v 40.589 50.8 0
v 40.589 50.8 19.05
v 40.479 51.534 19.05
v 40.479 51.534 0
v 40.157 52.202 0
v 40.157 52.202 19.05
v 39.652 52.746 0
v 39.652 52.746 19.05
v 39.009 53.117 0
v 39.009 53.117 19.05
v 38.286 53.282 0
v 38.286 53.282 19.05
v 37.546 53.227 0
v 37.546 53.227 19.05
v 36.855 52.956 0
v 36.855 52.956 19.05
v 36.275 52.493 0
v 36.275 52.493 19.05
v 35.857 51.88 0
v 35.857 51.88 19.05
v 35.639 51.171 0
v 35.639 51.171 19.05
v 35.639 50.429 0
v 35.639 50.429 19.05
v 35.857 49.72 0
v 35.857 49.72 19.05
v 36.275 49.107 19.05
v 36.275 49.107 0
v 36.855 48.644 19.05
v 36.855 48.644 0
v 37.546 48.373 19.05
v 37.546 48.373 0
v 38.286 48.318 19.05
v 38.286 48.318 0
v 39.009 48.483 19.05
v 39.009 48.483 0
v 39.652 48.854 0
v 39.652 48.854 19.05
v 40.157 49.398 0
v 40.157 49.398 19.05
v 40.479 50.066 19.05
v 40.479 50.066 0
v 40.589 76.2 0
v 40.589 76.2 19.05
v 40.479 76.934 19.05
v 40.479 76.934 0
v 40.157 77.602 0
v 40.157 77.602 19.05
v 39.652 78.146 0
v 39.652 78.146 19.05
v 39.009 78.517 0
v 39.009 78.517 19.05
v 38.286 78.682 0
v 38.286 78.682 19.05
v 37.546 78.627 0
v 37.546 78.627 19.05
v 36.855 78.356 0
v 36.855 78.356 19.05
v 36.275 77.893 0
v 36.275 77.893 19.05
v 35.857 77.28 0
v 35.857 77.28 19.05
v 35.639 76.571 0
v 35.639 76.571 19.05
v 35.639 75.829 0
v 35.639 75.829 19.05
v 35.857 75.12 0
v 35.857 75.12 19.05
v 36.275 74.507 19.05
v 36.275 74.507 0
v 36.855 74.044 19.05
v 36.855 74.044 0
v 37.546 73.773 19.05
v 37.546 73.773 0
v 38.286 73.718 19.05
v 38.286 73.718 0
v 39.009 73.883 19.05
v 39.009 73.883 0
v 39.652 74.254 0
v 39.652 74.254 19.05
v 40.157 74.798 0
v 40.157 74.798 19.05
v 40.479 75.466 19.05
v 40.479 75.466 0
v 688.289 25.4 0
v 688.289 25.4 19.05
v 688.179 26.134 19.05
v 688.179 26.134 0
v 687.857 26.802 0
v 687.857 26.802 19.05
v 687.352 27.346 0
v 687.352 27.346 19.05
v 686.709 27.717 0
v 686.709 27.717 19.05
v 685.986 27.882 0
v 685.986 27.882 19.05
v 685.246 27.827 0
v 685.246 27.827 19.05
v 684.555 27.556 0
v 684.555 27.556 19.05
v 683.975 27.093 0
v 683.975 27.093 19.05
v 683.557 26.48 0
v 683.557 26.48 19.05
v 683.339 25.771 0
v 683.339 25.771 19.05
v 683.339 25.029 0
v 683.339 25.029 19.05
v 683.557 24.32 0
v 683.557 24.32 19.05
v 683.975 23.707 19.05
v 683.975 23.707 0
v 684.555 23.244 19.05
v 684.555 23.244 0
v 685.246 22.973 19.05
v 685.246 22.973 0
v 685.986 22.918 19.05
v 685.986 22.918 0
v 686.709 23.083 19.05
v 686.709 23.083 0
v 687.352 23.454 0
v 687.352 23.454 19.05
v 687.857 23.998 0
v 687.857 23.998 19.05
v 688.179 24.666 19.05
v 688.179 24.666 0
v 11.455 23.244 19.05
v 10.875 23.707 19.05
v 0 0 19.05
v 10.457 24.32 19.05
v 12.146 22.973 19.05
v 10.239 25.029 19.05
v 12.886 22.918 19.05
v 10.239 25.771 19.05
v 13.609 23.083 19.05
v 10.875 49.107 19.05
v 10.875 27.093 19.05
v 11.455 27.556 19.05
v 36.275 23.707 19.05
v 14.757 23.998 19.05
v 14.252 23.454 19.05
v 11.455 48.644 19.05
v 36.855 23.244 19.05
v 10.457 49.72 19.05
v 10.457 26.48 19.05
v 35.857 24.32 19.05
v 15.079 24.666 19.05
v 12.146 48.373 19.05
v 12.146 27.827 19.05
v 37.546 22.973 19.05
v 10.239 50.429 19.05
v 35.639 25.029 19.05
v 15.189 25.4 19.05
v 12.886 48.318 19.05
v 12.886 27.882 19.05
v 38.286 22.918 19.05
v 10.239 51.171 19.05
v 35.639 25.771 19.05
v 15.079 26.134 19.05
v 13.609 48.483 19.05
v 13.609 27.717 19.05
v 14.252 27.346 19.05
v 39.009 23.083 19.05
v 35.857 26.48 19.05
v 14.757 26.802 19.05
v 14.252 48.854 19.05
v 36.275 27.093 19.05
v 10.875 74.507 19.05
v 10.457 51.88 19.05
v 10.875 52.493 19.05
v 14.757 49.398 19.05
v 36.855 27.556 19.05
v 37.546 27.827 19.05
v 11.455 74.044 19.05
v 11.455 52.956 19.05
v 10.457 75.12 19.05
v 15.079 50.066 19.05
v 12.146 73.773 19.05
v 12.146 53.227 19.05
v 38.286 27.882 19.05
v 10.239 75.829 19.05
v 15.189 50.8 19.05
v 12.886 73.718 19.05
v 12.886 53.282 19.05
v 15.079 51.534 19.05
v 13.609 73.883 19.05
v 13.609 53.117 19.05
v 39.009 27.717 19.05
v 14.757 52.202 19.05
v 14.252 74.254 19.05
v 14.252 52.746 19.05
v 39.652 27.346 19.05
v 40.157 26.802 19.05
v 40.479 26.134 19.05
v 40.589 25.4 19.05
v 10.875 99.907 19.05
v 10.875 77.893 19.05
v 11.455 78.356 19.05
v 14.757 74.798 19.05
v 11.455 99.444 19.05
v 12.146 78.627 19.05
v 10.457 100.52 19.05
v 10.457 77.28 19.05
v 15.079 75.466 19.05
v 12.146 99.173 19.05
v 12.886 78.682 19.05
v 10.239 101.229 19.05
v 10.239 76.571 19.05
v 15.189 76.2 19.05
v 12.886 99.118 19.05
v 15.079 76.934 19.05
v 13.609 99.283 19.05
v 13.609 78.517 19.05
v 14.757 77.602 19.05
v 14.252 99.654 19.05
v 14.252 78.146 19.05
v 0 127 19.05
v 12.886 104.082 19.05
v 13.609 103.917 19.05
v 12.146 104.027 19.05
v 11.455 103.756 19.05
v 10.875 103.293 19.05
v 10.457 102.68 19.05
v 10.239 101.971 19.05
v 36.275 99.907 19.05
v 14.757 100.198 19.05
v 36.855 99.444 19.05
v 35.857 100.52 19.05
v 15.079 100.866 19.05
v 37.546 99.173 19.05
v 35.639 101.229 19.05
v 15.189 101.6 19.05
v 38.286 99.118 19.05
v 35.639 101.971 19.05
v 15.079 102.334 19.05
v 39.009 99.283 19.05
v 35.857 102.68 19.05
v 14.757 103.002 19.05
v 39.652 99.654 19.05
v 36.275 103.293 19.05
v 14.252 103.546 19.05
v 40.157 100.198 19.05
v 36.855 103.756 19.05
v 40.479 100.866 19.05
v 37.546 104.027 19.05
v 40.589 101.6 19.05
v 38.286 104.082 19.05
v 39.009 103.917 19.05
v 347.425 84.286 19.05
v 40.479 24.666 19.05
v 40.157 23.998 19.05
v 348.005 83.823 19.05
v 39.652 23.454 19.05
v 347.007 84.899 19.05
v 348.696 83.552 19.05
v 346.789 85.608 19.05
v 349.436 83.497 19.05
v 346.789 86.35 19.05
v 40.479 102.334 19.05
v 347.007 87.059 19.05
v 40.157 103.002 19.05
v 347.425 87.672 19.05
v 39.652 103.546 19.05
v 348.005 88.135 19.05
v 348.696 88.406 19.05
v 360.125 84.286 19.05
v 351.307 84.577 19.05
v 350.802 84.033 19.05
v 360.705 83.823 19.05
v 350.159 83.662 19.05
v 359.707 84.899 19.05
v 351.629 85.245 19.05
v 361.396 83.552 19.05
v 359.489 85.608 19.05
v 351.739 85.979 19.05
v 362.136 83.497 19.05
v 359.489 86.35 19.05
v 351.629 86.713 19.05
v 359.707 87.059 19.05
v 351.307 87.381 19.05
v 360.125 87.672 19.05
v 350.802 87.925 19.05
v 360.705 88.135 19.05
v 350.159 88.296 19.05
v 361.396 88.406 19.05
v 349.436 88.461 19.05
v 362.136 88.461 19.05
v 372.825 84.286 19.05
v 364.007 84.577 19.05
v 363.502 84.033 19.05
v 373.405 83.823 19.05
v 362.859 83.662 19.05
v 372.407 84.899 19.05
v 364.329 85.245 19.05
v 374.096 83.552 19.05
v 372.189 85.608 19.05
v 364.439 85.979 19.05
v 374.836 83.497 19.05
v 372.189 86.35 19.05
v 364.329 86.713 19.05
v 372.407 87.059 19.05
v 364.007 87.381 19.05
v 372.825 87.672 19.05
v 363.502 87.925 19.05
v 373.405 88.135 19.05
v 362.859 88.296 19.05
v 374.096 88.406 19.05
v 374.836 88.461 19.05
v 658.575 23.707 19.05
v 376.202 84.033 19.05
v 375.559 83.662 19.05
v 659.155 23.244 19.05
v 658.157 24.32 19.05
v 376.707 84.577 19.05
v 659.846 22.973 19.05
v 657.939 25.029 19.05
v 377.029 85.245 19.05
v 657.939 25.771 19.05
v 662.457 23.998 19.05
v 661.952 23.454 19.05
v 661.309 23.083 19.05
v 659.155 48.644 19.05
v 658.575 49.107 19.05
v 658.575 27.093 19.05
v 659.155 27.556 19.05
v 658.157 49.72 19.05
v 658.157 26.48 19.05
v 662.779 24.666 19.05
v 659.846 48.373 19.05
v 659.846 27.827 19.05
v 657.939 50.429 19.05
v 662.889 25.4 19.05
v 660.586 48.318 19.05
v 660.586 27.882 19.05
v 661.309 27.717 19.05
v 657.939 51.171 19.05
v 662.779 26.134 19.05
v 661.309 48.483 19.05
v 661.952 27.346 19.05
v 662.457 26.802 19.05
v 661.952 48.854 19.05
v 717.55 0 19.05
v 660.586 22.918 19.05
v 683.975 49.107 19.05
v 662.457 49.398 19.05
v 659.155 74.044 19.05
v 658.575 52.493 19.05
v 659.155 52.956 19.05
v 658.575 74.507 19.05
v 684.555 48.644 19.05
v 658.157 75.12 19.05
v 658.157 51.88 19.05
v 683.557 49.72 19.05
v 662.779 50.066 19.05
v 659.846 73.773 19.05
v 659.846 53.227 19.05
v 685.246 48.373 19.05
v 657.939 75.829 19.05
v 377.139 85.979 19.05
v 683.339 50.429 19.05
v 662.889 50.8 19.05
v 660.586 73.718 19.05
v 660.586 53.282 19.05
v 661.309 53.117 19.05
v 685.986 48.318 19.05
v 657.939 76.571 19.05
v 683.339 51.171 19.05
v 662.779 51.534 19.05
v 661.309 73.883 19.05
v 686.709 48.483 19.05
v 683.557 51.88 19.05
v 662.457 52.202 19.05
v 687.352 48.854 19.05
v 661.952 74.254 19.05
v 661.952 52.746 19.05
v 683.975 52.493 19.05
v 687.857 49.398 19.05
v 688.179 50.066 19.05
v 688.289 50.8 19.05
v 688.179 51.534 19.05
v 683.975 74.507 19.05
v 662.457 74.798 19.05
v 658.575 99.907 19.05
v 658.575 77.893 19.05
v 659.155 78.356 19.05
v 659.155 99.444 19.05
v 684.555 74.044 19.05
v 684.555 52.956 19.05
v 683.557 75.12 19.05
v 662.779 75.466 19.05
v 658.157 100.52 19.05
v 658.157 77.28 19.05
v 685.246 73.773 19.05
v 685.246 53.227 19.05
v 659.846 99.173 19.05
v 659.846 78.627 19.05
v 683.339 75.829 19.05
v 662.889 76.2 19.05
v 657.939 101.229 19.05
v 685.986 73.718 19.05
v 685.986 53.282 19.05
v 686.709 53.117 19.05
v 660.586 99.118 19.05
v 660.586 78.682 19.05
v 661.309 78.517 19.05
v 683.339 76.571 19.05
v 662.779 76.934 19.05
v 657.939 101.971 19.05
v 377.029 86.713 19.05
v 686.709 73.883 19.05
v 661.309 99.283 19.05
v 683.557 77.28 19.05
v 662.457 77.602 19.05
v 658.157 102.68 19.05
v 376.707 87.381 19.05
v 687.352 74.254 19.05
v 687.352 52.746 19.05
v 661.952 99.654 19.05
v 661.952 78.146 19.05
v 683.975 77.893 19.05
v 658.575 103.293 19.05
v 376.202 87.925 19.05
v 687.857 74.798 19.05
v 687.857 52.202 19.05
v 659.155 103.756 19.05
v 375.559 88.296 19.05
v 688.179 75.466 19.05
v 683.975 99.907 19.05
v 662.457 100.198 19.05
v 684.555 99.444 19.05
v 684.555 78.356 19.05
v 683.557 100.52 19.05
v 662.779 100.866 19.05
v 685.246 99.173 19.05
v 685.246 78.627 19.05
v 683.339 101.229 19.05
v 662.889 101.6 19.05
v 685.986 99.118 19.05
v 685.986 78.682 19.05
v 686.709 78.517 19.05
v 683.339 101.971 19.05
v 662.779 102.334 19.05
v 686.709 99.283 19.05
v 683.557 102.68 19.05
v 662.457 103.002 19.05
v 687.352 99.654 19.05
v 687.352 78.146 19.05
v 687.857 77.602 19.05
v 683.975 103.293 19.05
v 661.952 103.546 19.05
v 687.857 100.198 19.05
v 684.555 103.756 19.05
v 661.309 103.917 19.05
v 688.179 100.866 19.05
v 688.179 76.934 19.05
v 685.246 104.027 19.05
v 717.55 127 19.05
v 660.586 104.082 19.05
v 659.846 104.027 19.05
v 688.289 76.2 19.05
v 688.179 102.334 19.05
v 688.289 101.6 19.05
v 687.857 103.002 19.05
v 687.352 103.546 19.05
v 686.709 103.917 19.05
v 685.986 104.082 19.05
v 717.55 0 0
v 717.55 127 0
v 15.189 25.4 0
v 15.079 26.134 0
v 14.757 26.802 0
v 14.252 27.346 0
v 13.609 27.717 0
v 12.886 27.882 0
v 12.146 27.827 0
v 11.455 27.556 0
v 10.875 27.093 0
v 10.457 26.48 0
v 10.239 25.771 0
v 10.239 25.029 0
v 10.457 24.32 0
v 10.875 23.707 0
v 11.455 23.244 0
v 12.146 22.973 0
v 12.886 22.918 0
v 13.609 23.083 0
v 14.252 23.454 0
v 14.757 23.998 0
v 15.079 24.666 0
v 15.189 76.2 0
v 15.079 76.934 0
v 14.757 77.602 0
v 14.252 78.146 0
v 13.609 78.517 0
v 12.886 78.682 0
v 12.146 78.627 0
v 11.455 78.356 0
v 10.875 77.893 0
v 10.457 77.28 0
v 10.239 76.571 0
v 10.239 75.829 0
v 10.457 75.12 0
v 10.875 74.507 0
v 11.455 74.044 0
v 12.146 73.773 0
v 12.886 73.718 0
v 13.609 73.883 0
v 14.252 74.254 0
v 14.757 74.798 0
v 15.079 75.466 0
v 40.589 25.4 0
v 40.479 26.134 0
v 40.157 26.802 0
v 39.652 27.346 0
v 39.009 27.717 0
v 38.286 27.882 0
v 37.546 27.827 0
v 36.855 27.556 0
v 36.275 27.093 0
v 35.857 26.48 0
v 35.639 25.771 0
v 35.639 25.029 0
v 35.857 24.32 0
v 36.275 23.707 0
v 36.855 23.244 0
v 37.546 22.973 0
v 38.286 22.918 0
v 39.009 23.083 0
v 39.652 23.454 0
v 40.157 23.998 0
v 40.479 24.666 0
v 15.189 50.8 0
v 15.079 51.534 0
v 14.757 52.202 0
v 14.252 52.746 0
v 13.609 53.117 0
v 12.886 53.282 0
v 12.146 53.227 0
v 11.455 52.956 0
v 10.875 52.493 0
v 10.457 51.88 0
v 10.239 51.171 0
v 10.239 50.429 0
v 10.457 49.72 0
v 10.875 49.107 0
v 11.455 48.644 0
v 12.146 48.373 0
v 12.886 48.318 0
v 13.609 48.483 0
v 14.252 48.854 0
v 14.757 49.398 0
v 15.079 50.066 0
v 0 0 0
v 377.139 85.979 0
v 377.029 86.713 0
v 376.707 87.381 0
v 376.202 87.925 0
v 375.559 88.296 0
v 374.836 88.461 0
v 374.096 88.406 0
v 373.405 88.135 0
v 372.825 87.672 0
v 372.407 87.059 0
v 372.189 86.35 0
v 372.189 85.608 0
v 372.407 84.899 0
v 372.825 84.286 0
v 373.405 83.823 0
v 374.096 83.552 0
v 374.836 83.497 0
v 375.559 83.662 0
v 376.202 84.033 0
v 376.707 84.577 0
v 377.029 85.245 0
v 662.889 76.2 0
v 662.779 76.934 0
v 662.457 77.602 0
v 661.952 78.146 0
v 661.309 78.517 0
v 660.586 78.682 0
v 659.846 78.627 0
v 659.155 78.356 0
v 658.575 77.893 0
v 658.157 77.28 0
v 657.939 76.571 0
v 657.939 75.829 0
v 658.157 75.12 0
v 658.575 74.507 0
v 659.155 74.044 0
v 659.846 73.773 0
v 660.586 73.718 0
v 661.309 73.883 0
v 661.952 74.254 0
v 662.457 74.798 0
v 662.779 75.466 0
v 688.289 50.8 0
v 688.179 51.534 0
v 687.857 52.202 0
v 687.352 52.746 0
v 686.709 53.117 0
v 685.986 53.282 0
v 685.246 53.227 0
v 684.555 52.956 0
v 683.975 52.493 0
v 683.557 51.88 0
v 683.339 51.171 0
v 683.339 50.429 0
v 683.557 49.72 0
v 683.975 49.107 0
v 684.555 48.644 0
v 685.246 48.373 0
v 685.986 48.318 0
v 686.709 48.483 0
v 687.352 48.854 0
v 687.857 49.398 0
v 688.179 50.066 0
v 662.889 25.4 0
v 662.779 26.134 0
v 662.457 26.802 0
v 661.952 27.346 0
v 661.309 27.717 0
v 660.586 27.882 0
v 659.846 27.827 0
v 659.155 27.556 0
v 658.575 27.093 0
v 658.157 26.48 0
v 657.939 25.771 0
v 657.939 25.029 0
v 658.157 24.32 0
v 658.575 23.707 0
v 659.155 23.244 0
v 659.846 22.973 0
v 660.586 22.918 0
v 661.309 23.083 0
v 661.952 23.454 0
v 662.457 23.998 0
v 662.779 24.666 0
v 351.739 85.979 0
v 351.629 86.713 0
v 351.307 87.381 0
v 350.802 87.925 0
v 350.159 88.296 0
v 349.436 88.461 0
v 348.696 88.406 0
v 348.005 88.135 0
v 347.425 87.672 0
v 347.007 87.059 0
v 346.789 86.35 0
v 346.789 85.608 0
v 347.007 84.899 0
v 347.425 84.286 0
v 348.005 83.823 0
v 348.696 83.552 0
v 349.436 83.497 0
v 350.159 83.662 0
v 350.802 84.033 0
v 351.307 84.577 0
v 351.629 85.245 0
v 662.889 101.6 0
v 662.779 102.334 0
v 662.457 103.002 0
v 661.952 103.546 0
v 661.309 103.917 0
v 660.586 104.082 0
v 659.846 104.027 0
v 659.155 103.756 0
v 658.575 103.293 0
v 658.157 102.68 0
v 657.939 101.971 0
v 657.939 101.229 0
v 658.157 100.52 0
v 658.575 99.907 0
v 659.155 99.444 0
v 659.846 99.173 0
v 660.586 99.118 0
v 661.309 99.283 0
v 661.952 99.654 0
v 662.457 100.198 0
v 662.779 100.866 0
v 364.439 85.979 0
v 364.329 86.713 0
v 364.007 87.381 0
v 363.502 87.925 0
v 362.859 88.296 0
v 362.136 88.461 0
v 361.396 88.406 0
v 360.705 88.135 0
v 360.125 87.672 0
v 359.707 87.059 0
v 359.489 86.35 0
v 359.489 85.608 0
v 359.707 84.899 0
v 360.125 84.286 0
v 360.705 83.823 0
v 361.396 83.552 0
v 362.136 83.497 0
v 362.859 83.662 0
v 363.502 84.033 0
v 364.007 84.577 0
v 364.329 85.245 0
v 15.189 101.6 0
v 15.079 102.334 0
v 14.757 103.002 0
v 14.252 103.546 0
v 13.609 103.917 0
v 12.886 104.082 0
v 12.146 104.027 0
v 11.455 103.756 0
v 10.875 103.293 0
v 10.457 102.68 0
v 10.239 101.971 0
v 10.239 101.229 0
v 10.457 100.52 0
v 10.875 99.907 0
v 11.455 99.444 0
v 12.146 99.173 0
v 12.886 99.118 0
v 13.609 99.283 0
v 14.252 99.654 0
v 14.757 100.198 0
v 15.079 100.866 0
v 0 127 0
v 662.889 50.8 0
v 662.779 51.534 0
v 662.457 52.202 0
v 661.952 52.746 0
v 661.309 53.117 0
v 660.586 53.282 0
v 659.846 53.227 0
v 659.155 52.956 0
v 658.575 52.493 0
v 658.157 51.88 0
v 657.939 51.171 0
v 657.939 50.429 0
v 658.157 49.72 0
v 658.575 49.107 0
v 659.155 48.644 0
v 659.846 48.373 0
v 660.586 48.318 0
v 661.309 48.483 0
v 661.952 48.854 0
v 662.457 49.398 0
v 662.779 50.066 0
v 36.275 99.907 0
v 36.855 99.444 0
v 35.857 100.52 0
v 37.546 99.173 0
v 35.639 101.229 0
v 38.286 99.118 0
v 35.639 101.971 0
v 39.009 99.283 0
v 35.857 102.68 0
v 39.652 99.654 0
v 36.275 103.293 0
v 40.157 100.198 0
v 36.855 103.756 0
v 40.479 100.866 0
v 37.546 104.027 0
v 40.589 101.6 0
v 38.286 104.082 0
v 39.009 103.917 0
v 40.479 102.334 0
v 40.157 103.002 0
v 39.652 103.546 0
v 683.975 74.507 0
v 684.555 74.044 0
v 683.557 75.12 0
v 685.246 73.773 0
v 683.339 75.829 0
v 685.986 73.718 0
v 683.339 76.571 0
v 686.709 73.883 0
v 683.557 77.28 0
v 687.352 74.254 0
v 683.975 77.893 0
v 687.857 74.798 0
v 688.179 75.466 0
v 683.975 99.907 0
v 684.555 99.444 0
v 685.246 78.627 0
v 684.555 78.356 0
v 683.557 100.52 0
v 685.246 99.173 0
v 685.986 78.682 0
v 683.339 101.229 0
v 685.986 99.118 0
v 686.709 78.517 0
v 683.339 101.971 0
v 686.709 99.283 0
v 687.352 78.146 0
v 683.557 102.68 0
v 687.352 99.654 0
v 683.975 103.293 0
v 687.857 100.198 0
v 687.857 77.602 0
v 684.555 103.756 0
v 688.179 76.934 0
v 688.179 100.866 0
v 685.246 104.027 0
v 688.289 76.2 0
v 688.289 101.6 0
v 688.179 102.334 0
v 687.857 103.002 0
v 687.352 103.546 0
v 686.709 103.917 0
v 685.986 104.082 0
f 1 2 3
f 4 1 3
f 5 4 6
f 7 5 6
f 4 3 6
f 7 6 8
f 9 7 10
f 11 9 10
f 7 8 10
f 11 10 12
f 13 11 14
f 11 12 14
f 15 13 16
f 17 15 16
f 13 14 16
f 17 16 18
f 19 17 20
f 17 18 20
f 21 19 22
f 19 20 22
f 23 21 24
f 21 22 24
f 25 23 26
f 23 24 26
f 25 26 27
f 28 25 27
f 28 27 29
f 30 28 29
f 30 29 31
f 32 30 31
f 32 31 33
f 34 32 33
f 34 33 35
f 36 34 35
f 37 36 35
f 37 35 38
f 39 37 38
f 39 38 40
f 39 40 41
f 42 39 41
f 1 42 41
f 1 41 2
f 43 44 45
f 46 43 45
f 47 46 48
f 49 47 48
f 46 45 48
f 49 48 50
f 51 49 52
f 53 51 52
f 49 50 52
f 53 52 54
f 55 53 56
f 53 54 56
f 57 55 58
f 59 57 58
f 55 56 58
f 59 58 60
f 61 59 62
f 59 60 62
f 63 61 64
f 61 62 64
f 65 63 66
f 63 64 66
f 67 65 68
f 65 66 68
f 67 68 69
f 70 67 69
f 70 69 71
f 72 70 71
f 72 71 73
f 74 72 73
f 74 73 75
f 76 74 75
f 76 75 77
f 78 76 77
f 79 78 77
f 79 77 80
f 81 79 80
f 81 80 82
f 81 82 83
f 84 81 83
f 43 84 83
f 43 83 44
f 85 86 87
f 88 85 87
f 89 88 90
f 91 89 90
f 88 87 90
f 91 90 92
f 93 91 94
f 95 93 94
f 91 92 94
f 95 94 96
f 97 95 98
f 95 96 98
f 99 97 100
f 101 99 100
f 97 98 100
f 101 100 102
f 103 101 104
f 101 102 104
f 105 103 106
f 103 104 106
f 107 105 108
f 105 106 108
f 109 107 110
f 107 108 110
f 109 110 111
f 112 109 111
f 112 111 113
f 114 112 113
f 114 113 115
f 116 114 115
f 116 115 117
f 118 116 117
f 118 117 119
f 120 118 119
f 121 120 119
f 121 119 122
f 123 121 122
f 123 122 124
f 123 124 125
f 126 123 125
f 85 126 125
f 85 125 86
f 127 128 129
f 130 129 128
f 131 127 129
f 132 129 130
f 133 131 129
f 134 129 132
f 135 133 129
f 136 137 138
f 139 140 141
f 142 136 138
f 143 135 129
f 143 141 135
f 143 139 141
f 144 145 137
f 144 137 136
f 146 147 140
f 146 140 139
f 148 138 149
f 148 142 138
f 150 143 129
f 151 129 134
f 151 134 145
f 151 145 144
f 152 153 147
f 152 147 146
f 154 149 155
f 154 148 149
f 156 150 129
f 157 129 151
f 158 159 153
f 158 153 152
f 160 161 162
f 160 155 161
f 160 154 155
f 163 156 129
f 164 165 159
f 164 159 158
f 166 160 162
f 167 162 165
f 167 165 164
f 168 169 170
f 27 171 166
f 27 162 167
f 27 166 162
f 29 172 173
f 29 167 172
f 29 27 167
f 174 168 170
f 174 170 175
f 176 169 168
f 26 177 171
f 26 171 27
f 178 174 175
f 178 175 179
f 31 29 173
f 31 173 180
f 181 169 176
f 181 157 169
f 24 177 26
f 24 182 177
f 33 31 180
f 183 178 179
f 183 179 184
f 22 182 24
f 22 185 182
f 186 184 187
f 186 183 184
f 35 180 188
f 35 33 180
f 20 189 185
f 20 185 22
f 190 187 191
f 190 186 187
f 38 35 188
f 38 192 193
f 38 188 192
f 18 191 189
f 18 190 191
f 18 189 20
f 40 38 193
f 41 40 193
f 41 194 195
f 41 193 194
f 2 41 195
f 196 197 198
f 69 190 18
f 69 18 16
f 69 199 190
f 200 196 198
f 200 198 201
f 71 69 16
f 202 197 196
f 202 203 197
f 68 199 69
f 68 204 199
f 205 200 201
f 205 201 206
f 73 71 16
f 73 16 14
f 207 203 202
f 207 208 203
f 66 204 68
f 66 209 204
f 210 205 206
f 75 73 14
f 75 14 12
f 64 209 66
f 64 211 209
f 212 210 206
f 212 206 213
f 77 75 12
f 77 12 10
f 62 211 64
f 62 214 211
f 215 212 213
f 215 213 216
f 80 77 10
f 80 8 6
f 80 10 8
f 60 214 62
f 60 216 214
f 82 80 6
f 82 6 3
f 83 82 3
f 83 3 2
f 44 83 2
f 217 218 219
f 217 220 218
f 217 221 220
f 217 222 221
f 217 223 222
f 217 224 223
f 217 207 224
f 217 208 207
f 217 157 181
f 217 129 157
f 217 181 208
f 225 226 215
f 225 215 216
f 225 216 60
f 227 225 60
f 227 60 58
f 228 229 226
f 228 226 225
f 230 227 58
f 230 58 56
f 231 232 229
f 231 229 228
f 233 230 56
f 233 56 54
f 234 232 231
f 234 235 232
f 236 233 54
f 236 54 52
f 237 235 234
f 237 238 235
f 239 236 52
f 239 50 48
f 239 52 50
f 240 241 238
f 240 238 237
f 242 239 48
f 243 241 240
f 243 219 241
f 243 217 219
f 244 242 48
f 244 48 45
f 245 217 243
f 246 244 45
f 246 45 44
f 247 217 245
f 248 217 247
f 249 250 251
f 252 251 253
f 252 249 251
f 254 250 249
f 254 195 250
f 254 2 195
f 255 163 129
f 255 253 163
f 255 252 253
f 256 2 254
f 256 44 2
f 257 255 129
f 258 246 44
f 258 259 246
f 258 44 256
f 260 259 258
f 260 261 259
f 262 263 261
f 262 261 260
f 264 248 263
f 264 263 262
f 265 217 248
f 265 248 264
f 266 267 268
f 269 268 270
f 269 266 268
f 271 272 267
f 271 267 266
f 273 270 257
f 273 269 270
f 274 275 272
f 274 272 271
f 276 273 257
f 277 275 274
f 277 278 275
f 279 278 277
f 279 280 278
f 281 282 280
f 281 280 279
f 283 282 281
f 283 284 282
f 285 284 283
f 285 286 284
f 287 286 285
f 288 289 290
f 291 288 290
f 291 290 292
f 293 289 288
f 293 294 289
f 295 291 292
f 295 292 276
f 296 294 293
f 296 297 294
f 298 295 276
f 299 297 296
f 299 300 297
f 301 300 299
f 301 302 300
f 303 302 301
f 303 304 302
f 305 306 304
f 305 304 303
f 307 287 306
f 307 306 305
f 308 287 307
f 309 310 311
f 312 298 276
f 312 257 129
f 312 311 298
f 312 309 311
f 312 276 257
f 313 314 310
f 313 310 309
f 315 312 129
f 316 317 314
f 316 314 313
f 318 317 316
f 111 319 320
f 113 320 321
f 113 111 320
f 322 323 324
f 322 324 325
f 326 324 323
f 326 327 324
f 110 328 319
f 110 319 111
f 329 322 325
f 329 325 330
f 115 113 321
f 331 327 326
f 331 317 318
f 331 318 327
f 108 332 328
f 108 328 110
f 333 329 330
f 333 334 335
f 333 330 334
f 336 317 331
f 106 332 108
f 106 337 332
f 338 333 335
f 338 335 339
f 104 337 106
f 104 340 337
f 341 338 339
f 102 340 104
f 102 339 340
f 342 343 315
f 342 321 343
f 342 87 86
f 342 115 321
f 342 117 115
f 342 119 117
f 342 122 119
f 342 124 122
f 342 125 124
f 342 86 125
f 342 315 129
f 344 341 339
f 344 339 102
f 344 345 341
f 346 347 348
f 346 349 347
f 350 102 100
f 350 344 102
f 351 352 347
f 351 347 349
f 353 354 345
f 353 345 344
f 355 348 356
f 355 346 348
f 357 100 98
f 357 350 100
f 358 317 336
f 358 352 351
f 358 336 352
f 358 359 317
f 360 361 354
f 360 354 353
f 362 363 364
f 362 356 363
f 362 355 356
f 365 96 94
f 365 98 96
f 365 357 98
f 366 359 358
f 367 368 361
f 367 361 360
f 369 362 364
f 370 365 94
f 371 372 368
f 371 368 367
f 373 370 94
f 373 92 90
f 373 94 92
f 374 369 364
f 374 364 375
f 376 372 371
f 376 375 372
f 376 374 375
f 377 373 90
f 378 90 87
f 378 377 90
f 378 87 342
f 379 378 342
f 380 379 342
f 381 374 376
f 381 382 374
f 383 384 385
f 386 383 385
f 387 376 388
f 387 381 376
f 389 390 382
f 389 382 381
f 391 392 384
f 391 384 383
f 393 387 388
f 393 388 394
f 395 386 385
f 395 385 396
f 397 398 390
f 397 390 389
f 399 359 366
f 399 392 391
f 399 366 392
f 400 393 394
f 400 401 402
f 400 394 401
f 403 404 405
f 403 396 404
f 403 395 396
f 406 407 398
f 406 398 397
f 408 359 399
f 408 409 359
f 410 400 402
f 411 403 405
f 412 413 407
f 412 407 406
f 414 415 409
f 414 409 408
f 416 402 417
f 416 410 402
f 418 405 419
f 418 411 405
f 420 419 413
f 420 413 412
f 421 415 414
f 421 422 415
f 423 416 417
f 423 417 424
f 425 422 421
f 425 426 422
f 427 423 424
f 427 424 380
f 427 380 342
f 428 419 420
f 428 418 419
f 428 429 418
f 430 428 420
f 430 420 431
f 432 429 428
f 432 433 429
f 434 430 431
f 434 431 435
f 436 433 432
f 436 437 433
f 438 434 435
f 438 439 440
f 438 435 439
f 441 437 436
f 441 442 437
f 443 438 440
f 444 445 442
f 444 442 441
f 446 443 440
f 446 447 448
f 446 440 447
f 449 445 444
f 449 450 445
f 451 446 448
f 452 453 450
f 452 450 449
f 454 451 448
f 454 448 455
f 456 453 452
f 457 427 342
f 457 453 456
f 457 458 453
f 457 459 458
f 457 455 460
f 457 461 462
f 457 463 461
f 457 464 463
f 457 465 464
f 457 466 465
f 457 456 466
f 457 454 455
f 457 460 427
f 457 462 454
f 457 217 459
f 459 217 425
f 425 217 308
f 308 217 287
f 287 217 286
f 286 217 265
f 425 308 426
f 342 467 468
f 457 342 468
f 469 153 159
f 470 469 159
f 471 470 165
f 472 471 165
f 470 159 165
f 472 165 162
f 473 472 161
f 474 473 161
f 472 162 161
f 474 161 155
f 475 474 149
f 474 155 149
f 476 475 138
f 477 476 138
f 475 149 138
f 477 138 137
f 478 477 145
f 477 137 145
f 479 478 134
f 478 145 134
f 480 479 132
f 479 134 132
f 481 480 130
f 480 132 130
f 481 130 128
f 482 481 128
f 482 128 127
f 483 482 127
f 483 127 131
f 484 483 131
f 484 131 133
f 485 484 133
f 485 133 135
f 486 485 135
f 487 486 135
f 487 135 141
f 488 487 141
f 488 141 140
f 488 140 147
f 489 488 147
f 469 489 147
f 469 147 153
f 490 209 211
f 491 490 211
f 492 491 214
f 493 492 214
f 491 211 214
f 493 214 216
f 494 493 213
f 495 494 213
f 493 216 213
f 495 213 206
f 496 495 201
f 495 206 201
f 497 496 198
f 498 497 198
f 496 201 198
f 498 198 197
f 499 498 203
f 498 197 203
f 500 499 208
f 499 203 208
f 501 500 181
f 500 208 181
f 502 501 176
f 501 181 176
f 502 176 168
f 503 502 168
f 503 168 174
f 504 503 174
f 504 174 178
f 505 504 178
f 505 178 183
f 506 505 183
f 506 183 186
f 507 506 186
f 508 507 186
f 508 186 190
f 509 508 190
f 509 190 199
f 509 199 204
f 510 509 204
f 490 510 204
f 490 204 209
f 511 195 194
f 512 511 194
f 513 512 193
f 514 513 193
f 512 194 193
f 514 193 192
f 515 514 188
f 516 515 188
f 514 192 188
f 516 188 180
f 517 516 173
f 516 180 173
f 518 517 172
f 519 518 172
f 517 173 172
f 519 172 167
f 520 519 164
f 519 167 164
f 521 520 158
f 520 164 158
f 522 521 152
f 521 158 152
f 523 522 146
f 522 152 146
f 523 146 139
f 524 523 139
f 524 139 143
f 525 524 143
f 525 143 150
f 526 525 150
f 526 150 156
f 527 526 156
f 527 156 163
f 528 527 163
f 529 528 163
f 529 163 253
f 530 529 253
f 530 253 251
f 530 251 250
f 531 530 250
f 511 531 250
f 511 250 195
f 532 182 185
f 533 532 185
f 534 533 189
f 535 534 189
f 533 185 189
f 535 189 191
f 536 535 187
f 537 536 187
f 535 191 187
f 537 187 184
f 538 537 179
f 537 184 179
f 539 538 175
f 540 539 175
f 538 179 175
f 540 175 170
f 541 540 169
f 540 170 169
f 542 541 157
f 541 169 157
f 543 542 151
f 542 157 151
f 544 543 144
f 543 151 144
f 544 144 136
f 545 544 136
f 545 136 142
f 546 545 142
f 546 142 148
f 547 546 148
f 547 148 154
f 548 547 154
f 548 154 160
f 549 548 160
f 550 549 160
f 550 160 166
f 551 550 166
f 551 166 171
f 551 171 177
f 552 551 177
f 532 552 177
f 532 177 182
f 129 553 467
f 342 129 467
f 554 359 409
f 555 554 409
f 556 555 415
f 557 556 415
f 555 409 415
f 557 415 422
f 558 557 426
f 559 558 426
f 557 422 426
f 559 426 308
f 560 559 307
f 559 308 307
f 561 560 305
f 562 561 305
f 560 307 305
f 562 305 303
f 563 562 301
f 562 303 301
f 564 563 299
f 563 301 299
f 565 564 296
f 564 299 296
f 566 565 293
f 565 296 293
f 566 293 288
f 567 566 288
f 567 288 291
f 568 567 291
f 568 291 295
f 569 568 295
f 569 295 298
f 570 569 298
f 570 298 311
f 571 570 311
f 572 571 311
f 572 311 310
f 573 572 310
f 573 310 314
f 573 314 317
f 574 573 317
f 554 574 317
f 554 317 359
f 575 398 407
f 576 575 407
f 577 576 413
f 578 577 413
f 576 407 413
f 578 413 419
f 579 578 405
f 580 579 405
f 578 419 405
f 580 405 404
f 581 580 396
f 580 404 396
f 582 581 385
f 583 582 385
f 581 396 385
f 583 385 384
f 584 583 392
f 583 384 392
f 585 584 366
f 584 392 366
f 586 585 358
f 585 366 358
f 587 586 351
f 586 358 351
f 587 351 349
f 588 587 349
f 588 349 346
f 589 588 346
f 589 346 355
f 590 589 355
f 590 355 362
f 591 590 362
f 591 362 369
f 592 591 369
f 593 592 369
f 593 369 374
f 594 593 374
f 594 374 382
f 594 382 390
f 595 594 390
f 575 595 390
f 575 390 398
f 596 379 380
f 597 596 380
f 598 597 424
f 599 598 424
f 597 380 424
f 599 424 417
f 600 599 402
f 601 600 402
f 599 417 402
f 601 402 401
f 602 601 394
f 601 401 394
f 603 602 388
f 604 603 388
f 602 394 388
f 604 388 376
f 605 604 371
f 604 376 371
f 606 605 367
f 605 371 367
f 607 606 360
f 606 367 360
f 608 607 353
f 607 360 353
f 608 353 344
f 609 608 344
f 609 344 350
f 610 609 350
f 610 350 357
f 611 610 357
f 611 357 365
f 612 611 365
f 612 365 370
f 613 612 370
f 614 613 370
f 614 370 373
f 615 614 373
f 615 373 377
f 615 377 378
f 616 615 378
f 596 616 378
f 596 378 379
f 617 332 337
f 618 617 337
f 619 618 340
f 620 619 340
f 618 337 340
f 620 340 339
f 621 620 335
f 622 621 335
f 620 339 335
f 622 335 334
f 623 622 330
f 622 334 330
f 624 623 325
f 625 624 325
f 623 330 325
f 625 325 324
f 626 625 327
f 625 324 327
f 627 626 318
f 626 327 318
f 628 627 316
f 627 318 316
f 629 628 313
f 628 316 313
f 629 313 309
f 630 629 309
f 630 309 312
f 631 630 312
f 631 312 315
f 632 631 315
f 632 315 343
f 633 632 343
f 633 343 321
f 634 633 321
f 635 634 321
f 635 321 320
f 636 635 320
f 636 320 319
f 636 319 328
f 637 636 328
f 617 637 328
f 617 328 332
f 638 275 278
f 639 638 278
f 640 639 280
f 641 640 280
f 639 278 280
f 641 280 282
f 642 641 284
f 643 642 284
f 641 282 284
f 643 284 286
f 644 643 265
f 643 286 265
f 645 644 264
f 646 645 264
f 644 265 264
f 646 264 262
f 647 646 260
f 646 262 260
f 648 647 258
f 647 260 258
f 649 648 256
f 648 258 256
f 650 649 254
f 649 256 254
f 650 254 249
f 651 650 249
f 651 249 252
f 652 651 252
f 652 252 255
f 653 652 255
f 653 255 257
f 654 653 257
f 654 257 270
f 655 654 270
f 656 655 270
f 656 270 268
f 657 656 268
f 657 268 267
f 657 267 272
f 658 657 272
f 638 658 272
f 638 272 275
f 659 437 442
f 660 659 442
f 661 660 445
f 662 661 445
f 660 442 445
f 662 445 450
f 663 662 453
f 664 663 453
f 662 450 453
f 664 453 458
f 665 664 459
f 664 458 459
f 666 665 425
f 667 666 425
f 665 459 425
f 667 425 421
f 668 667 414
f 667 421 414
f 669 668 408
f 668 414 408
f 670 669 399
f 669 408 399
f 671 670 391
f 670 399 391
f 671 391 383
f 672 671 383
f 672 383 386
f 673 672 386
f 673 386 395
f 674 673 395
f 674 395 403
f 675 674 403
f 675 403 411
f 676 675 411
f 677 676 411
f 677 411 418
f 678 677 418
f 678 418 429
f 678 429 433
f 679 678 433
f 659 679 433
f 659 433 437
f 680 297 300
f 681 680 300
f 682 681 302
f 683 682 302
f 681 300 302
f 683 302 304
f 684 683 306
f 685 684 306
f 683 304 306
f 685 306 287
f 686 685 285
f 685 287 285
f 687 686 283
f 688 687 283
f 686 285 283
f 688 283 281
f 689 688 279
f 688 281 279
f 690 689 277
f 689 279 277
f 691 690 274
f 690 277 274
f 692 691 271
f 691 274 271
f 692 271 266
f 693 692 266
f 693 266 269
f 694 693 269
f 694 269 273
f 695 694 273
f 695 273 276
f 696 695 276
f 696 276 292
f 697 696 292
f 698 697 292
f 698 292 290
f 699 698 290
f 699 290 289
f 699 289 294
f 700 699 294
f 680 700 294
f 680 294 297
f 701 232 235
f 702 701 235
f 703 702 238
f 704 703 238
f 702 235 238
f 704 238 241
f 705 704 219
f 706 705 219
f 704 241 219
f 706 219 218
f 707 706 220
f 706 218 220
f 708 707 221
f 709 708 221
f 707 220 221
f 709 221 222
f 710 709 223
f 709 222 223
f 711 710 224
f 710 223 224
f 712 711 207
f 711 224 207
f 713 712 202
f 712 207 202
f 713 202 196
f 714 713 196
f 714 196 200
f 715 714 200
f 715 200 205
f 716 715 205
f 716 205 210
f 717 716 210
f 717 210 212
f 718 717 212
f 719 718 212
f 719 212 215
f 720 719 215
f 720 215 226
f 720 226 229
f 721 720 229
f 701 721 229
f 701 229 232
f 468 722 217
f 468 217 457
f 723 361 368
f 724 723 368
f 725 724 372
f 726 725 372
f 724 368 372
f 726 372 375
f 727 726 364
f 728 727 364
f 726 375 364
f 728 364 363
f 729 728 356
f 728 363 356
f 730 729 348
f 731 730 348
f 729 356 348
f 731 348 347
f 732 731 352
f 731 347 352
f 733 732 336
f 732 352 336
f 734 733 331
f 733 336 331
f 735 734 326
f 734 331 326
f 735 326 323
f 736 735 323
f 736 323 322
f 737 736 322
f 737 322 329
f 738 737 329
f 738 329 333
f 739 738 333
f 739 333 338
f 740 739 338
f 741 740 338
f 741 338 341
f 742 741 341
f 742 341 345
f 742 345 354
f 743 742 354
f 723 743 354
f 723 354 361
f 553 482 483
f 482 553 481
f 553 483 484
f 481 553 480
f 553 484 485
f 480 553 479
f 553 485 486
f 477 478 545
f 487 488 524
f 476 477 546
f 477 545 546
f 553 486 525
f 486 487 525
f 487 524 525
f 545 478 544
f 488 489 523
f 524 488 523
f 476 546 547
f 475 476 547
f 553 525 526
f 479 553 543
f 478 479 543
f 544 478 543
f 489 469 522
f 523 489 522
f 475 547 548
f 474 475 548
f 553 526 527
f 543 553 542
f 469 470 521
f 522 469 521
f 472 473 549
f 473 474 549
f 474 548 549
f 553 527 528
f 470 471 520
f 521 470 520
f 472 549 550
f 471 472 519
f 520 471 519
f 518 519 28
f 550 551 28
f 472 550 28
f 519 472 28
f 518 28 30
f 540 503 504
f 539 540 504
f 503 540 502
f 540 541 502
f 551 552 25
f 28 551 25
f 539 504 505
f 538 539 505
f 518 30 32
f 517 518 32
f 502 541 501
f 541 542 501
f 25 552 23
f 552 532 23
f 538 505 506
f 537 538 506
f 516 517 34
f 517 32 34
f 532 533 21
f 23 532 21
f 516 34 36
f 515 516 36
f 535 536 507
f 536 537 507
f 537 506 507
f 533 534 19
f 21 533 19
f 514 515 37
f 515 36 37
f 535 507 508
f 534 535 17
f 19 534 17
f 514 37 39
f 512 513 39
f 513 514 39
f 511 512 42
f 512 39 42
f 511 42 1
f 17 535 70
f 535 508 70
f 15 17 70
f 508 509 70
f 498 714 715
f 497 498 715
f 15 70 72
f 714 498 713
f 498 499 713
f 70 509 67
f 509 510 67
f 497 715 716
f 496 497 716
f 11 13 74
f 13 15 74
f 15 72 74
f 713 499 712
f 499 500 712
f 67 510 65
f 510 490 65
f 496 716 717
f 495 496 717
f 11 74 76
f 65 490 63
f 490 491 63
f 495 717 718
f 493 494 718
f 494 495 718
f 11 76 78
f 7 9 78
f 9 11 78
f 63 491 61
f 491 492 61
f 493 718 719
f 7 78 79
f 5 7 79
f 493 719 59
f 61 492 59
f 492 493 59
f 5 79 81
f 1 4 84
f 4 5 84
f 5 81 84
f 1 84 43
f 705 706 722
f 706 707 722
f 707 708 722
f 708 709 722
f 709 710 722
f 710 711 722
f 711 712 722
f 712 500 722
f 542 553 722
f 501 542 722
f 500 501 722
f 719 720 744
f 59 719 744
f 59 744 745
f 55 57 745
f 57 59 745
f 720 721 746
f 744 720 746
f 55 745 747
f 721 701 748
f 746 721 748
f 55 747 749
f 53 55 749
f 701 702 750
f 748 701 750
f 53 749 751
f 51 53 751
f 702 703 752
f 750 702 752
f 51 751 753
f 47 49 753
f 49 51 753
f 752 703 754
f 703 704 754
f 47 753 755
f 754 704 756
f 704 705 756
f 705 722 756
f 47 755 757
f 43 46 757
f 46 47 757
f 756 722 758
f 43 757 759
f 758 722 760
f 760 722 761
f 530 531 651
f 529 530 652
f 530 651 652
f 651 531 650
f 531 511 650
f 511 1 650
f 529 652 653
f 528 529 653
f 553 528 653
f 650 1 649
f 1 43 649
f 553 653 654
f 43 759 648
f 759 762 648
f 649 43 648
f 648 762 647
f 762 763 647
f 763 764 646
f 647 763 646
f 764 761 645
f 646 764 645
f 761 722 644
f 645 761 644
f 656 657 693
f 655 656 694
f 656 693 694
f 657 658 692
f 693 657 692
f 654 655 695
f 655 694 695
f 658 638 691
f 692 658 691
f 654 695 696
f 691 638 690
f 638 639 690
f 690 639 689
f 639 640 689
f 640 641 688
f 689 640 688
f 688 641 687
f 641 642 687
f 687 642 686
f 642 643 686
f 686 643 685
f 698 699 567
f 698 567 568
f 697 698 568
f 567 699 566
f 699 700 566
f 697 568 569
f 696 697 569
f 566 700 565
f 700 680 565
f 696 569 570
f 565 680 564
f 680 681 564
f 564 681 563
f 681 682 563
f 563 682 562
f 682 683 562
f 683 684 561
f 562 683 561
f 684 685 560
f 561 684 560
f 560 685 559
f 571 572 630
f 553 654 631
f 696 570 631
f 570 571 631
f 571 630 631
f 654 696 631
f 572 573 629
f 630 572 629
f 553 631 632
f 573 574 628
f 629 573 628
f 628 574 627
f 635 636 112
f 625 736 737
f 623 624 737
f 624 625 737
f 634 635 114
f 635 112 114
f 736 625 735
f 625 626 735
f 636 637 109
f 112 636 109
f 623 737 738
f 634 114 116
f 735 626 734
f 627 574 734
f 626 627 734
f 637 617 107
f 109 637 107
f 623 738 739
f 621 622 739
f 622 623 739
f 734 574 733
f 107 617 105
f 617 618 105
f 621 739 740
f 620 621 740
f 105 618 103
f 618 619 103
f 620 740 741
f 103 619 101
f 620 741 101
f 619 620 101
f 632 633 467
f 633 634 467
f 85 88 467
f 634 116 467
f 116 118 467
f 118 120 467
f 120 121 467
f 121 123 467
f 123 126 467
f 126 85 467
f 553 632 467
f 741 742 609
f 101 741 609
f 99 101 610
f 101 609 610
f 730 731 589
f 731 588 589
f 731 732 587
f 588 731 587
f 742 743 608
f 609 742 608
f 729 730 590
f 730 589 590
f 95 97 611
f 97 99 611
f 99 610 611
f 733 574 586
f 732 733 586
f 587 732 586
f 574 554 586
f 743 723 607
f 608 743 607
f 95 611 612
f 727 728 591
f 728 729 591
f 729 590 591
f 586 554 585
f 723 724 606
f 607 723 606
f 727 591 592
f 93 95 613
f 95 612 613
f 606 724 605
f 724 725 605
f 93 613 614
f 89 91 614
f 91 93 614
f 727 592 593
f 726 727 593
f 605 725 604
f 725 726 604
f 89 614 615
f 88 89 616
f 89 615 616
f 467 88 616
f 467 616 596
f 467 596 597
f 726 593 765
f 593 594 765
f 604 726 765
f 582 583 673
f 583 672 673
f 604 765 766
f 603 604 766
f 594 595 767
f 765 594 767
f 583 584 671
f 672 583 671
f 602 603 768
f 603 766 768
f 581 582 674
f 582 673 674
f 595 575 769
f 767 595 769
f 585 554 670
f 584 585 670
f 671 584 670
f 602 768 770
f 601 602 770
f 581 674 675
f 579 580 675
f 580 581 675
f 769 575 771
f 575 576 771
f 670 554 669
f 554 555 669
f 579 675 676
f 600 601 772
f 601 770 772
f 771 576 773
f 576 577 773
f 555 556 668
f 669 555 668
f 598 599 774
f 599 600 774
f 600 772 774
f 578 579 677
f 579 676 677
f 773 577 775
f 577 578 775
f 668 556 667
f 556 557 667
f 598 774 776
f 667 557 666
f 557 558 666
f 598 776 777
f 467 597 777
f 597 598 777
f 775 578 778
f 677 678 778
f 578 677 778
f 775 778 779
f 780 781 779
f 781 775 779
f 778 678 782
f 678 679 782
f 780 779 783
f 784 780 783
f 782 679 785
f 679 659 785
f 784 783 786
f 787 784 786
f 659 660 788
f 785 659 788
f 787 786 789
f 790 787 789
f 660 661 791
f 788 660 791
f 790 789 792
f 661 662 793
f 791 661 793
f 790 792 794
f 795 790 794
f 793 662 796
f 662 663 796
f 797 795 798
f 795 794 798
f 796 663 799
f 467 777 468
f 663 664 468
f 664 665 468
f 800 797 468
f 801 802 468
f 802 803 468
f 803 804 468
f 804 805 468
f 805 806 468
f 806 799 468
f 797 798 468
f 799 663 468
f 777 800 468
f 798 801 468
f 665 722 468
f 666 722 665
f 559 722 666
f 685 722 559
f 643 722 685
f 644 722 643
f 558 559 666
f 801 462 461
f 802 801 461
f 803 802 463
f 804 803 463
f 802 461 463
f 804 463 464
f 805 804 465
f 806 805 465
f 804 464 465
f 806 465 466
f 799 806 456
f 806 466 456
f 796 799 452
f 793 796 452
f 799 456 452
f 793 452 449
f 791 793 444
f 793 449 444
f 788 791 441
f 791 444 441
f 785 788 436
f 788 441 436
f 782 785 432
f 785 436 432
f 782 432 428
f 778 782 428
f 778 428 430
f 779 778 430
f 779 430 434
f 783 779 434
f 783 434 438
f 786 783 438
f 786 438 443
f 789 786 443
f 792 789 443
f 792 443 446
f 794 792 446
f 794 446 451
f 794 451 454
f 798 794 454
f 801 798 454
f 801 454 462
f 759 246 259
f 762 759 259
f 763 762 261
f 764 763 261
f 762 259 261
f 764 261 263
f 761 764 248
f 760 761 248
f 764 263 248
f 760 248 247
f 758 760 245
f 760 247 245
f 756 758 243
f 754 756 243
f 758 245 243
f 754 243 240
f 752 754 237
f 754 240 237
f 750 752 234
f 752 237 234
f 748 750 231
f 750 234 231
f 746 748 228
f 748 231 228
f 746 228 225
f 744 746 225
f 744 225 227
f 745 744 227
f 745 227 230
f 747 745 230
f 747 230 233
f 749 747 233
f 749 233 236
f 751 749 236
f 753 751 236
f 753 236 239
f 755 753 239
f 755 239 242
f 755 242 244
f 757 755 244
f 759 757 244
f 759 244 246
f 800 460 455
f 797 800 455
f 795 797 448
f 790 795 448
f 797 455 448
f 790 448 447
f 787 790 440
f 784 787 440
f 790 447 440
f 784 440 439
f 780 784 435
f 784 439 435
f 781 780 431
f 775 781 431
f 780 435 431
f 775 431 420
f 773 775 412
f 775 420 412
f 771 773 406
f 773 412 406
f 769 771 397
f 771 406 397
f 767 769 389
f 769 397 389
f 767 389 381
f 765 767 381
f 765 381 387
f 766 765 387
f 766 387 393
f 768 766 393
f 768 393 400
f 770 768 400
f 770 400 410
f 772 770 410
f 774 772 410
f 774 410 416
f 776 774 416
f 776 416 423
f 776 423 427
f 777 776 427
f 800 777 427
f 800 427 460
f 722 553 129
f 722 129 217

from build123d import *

# Parameters (mm, degrees)
SKETCH1_W           = 717.55
SKETCH1_H           = 127
BOSS_EXTRUDE1_DEPTH = 19.05
SKETCH2_R           = 2.4892
CUT_EXTRUDE1_DEPTH  = 25.4
SKETCH4_R           = 2.4892
CUT_EXTRUDE2_DEPTH  = 729.951236366


with BuildPart() as part:
    # Sketch1 → Boss-Extrude1 (new body)
    with BuildSketch(Plane.XY):
        with Locations((358.775, 63.5)):
            Rectangle(SKETCH1_W, SKETCH1_H)
    extrude(amount=BOSS_EXTRUDE1_DEPTH)

    # Sketch2 → Cut-Extrude1 (cut)
    with BuildSketch(Plane.XY.offset(19.05)):
        with Locations((12.7, 101.6)):
            Circle(SKETCH2_R)
        with Locations((38.1, 101.6)):
            Circle(SKETCH2_R)
        with Locations((38.1, 76.2)):
            Circle(SKETCH2_R)
        with Locations((38.1, 50.8)):
            Circle(SKETCH2_R)
        with Locations((38.1, 25.4)):
            Circle(SKETCH2_R)
        with Locations((12.7, 76.2)):
            Circle(SKETCH2_R)
        with Locations((12.7, 50.8)):
            Circle(SKETCH2_R)
        with Locations((12.7, 25.4)):
            Circle(SKETCH2_R)
        with Locations((685.8, 101.6)):
            Circle(SKETCH2_R)
        with Locations((660.4, 101.6)):
            Circle(SKETCH2_R)
        with Locations((660.4, 76.2)):
            Circle(SKETCH2_R)
        with Locations((660.4, 50.8)):
            Circle(SKETCH2_R)
        with Locations((660.4, 25.4)):
            Circle(SKETCH2_R)
        with Locations((685.8, 76.2)):
            Circle(SKETCH2_R)
        with Locations((685.8, 50.8)):
            Circle(SKETCH2_R)
        with Locations((685.8, 25.4)):
            Circle(SKETCH2_R)
    extrude(amount=-CUT_EXTRUDE1_DEPTH, mode=Mode.SUBTRACT)

    # Sketch4 → Cut-Extrude2 (cut, through all)
    with BuildSketch(Plane.XY.offset(19.05)):
        with Locations((349.25, 85.979)):
            Circle(SKETCH4_R)
        with Locations((361.95, 85.979)):
            Circle(SKETCH4_R)
        with Locations((374.65, 85.979)):
            Circle(SKETCH4_R)
    extrude(amount=-CUT_EXTRUDE2_DEPTH, mode=Mode.SUBTRACT)


solid = part.part
